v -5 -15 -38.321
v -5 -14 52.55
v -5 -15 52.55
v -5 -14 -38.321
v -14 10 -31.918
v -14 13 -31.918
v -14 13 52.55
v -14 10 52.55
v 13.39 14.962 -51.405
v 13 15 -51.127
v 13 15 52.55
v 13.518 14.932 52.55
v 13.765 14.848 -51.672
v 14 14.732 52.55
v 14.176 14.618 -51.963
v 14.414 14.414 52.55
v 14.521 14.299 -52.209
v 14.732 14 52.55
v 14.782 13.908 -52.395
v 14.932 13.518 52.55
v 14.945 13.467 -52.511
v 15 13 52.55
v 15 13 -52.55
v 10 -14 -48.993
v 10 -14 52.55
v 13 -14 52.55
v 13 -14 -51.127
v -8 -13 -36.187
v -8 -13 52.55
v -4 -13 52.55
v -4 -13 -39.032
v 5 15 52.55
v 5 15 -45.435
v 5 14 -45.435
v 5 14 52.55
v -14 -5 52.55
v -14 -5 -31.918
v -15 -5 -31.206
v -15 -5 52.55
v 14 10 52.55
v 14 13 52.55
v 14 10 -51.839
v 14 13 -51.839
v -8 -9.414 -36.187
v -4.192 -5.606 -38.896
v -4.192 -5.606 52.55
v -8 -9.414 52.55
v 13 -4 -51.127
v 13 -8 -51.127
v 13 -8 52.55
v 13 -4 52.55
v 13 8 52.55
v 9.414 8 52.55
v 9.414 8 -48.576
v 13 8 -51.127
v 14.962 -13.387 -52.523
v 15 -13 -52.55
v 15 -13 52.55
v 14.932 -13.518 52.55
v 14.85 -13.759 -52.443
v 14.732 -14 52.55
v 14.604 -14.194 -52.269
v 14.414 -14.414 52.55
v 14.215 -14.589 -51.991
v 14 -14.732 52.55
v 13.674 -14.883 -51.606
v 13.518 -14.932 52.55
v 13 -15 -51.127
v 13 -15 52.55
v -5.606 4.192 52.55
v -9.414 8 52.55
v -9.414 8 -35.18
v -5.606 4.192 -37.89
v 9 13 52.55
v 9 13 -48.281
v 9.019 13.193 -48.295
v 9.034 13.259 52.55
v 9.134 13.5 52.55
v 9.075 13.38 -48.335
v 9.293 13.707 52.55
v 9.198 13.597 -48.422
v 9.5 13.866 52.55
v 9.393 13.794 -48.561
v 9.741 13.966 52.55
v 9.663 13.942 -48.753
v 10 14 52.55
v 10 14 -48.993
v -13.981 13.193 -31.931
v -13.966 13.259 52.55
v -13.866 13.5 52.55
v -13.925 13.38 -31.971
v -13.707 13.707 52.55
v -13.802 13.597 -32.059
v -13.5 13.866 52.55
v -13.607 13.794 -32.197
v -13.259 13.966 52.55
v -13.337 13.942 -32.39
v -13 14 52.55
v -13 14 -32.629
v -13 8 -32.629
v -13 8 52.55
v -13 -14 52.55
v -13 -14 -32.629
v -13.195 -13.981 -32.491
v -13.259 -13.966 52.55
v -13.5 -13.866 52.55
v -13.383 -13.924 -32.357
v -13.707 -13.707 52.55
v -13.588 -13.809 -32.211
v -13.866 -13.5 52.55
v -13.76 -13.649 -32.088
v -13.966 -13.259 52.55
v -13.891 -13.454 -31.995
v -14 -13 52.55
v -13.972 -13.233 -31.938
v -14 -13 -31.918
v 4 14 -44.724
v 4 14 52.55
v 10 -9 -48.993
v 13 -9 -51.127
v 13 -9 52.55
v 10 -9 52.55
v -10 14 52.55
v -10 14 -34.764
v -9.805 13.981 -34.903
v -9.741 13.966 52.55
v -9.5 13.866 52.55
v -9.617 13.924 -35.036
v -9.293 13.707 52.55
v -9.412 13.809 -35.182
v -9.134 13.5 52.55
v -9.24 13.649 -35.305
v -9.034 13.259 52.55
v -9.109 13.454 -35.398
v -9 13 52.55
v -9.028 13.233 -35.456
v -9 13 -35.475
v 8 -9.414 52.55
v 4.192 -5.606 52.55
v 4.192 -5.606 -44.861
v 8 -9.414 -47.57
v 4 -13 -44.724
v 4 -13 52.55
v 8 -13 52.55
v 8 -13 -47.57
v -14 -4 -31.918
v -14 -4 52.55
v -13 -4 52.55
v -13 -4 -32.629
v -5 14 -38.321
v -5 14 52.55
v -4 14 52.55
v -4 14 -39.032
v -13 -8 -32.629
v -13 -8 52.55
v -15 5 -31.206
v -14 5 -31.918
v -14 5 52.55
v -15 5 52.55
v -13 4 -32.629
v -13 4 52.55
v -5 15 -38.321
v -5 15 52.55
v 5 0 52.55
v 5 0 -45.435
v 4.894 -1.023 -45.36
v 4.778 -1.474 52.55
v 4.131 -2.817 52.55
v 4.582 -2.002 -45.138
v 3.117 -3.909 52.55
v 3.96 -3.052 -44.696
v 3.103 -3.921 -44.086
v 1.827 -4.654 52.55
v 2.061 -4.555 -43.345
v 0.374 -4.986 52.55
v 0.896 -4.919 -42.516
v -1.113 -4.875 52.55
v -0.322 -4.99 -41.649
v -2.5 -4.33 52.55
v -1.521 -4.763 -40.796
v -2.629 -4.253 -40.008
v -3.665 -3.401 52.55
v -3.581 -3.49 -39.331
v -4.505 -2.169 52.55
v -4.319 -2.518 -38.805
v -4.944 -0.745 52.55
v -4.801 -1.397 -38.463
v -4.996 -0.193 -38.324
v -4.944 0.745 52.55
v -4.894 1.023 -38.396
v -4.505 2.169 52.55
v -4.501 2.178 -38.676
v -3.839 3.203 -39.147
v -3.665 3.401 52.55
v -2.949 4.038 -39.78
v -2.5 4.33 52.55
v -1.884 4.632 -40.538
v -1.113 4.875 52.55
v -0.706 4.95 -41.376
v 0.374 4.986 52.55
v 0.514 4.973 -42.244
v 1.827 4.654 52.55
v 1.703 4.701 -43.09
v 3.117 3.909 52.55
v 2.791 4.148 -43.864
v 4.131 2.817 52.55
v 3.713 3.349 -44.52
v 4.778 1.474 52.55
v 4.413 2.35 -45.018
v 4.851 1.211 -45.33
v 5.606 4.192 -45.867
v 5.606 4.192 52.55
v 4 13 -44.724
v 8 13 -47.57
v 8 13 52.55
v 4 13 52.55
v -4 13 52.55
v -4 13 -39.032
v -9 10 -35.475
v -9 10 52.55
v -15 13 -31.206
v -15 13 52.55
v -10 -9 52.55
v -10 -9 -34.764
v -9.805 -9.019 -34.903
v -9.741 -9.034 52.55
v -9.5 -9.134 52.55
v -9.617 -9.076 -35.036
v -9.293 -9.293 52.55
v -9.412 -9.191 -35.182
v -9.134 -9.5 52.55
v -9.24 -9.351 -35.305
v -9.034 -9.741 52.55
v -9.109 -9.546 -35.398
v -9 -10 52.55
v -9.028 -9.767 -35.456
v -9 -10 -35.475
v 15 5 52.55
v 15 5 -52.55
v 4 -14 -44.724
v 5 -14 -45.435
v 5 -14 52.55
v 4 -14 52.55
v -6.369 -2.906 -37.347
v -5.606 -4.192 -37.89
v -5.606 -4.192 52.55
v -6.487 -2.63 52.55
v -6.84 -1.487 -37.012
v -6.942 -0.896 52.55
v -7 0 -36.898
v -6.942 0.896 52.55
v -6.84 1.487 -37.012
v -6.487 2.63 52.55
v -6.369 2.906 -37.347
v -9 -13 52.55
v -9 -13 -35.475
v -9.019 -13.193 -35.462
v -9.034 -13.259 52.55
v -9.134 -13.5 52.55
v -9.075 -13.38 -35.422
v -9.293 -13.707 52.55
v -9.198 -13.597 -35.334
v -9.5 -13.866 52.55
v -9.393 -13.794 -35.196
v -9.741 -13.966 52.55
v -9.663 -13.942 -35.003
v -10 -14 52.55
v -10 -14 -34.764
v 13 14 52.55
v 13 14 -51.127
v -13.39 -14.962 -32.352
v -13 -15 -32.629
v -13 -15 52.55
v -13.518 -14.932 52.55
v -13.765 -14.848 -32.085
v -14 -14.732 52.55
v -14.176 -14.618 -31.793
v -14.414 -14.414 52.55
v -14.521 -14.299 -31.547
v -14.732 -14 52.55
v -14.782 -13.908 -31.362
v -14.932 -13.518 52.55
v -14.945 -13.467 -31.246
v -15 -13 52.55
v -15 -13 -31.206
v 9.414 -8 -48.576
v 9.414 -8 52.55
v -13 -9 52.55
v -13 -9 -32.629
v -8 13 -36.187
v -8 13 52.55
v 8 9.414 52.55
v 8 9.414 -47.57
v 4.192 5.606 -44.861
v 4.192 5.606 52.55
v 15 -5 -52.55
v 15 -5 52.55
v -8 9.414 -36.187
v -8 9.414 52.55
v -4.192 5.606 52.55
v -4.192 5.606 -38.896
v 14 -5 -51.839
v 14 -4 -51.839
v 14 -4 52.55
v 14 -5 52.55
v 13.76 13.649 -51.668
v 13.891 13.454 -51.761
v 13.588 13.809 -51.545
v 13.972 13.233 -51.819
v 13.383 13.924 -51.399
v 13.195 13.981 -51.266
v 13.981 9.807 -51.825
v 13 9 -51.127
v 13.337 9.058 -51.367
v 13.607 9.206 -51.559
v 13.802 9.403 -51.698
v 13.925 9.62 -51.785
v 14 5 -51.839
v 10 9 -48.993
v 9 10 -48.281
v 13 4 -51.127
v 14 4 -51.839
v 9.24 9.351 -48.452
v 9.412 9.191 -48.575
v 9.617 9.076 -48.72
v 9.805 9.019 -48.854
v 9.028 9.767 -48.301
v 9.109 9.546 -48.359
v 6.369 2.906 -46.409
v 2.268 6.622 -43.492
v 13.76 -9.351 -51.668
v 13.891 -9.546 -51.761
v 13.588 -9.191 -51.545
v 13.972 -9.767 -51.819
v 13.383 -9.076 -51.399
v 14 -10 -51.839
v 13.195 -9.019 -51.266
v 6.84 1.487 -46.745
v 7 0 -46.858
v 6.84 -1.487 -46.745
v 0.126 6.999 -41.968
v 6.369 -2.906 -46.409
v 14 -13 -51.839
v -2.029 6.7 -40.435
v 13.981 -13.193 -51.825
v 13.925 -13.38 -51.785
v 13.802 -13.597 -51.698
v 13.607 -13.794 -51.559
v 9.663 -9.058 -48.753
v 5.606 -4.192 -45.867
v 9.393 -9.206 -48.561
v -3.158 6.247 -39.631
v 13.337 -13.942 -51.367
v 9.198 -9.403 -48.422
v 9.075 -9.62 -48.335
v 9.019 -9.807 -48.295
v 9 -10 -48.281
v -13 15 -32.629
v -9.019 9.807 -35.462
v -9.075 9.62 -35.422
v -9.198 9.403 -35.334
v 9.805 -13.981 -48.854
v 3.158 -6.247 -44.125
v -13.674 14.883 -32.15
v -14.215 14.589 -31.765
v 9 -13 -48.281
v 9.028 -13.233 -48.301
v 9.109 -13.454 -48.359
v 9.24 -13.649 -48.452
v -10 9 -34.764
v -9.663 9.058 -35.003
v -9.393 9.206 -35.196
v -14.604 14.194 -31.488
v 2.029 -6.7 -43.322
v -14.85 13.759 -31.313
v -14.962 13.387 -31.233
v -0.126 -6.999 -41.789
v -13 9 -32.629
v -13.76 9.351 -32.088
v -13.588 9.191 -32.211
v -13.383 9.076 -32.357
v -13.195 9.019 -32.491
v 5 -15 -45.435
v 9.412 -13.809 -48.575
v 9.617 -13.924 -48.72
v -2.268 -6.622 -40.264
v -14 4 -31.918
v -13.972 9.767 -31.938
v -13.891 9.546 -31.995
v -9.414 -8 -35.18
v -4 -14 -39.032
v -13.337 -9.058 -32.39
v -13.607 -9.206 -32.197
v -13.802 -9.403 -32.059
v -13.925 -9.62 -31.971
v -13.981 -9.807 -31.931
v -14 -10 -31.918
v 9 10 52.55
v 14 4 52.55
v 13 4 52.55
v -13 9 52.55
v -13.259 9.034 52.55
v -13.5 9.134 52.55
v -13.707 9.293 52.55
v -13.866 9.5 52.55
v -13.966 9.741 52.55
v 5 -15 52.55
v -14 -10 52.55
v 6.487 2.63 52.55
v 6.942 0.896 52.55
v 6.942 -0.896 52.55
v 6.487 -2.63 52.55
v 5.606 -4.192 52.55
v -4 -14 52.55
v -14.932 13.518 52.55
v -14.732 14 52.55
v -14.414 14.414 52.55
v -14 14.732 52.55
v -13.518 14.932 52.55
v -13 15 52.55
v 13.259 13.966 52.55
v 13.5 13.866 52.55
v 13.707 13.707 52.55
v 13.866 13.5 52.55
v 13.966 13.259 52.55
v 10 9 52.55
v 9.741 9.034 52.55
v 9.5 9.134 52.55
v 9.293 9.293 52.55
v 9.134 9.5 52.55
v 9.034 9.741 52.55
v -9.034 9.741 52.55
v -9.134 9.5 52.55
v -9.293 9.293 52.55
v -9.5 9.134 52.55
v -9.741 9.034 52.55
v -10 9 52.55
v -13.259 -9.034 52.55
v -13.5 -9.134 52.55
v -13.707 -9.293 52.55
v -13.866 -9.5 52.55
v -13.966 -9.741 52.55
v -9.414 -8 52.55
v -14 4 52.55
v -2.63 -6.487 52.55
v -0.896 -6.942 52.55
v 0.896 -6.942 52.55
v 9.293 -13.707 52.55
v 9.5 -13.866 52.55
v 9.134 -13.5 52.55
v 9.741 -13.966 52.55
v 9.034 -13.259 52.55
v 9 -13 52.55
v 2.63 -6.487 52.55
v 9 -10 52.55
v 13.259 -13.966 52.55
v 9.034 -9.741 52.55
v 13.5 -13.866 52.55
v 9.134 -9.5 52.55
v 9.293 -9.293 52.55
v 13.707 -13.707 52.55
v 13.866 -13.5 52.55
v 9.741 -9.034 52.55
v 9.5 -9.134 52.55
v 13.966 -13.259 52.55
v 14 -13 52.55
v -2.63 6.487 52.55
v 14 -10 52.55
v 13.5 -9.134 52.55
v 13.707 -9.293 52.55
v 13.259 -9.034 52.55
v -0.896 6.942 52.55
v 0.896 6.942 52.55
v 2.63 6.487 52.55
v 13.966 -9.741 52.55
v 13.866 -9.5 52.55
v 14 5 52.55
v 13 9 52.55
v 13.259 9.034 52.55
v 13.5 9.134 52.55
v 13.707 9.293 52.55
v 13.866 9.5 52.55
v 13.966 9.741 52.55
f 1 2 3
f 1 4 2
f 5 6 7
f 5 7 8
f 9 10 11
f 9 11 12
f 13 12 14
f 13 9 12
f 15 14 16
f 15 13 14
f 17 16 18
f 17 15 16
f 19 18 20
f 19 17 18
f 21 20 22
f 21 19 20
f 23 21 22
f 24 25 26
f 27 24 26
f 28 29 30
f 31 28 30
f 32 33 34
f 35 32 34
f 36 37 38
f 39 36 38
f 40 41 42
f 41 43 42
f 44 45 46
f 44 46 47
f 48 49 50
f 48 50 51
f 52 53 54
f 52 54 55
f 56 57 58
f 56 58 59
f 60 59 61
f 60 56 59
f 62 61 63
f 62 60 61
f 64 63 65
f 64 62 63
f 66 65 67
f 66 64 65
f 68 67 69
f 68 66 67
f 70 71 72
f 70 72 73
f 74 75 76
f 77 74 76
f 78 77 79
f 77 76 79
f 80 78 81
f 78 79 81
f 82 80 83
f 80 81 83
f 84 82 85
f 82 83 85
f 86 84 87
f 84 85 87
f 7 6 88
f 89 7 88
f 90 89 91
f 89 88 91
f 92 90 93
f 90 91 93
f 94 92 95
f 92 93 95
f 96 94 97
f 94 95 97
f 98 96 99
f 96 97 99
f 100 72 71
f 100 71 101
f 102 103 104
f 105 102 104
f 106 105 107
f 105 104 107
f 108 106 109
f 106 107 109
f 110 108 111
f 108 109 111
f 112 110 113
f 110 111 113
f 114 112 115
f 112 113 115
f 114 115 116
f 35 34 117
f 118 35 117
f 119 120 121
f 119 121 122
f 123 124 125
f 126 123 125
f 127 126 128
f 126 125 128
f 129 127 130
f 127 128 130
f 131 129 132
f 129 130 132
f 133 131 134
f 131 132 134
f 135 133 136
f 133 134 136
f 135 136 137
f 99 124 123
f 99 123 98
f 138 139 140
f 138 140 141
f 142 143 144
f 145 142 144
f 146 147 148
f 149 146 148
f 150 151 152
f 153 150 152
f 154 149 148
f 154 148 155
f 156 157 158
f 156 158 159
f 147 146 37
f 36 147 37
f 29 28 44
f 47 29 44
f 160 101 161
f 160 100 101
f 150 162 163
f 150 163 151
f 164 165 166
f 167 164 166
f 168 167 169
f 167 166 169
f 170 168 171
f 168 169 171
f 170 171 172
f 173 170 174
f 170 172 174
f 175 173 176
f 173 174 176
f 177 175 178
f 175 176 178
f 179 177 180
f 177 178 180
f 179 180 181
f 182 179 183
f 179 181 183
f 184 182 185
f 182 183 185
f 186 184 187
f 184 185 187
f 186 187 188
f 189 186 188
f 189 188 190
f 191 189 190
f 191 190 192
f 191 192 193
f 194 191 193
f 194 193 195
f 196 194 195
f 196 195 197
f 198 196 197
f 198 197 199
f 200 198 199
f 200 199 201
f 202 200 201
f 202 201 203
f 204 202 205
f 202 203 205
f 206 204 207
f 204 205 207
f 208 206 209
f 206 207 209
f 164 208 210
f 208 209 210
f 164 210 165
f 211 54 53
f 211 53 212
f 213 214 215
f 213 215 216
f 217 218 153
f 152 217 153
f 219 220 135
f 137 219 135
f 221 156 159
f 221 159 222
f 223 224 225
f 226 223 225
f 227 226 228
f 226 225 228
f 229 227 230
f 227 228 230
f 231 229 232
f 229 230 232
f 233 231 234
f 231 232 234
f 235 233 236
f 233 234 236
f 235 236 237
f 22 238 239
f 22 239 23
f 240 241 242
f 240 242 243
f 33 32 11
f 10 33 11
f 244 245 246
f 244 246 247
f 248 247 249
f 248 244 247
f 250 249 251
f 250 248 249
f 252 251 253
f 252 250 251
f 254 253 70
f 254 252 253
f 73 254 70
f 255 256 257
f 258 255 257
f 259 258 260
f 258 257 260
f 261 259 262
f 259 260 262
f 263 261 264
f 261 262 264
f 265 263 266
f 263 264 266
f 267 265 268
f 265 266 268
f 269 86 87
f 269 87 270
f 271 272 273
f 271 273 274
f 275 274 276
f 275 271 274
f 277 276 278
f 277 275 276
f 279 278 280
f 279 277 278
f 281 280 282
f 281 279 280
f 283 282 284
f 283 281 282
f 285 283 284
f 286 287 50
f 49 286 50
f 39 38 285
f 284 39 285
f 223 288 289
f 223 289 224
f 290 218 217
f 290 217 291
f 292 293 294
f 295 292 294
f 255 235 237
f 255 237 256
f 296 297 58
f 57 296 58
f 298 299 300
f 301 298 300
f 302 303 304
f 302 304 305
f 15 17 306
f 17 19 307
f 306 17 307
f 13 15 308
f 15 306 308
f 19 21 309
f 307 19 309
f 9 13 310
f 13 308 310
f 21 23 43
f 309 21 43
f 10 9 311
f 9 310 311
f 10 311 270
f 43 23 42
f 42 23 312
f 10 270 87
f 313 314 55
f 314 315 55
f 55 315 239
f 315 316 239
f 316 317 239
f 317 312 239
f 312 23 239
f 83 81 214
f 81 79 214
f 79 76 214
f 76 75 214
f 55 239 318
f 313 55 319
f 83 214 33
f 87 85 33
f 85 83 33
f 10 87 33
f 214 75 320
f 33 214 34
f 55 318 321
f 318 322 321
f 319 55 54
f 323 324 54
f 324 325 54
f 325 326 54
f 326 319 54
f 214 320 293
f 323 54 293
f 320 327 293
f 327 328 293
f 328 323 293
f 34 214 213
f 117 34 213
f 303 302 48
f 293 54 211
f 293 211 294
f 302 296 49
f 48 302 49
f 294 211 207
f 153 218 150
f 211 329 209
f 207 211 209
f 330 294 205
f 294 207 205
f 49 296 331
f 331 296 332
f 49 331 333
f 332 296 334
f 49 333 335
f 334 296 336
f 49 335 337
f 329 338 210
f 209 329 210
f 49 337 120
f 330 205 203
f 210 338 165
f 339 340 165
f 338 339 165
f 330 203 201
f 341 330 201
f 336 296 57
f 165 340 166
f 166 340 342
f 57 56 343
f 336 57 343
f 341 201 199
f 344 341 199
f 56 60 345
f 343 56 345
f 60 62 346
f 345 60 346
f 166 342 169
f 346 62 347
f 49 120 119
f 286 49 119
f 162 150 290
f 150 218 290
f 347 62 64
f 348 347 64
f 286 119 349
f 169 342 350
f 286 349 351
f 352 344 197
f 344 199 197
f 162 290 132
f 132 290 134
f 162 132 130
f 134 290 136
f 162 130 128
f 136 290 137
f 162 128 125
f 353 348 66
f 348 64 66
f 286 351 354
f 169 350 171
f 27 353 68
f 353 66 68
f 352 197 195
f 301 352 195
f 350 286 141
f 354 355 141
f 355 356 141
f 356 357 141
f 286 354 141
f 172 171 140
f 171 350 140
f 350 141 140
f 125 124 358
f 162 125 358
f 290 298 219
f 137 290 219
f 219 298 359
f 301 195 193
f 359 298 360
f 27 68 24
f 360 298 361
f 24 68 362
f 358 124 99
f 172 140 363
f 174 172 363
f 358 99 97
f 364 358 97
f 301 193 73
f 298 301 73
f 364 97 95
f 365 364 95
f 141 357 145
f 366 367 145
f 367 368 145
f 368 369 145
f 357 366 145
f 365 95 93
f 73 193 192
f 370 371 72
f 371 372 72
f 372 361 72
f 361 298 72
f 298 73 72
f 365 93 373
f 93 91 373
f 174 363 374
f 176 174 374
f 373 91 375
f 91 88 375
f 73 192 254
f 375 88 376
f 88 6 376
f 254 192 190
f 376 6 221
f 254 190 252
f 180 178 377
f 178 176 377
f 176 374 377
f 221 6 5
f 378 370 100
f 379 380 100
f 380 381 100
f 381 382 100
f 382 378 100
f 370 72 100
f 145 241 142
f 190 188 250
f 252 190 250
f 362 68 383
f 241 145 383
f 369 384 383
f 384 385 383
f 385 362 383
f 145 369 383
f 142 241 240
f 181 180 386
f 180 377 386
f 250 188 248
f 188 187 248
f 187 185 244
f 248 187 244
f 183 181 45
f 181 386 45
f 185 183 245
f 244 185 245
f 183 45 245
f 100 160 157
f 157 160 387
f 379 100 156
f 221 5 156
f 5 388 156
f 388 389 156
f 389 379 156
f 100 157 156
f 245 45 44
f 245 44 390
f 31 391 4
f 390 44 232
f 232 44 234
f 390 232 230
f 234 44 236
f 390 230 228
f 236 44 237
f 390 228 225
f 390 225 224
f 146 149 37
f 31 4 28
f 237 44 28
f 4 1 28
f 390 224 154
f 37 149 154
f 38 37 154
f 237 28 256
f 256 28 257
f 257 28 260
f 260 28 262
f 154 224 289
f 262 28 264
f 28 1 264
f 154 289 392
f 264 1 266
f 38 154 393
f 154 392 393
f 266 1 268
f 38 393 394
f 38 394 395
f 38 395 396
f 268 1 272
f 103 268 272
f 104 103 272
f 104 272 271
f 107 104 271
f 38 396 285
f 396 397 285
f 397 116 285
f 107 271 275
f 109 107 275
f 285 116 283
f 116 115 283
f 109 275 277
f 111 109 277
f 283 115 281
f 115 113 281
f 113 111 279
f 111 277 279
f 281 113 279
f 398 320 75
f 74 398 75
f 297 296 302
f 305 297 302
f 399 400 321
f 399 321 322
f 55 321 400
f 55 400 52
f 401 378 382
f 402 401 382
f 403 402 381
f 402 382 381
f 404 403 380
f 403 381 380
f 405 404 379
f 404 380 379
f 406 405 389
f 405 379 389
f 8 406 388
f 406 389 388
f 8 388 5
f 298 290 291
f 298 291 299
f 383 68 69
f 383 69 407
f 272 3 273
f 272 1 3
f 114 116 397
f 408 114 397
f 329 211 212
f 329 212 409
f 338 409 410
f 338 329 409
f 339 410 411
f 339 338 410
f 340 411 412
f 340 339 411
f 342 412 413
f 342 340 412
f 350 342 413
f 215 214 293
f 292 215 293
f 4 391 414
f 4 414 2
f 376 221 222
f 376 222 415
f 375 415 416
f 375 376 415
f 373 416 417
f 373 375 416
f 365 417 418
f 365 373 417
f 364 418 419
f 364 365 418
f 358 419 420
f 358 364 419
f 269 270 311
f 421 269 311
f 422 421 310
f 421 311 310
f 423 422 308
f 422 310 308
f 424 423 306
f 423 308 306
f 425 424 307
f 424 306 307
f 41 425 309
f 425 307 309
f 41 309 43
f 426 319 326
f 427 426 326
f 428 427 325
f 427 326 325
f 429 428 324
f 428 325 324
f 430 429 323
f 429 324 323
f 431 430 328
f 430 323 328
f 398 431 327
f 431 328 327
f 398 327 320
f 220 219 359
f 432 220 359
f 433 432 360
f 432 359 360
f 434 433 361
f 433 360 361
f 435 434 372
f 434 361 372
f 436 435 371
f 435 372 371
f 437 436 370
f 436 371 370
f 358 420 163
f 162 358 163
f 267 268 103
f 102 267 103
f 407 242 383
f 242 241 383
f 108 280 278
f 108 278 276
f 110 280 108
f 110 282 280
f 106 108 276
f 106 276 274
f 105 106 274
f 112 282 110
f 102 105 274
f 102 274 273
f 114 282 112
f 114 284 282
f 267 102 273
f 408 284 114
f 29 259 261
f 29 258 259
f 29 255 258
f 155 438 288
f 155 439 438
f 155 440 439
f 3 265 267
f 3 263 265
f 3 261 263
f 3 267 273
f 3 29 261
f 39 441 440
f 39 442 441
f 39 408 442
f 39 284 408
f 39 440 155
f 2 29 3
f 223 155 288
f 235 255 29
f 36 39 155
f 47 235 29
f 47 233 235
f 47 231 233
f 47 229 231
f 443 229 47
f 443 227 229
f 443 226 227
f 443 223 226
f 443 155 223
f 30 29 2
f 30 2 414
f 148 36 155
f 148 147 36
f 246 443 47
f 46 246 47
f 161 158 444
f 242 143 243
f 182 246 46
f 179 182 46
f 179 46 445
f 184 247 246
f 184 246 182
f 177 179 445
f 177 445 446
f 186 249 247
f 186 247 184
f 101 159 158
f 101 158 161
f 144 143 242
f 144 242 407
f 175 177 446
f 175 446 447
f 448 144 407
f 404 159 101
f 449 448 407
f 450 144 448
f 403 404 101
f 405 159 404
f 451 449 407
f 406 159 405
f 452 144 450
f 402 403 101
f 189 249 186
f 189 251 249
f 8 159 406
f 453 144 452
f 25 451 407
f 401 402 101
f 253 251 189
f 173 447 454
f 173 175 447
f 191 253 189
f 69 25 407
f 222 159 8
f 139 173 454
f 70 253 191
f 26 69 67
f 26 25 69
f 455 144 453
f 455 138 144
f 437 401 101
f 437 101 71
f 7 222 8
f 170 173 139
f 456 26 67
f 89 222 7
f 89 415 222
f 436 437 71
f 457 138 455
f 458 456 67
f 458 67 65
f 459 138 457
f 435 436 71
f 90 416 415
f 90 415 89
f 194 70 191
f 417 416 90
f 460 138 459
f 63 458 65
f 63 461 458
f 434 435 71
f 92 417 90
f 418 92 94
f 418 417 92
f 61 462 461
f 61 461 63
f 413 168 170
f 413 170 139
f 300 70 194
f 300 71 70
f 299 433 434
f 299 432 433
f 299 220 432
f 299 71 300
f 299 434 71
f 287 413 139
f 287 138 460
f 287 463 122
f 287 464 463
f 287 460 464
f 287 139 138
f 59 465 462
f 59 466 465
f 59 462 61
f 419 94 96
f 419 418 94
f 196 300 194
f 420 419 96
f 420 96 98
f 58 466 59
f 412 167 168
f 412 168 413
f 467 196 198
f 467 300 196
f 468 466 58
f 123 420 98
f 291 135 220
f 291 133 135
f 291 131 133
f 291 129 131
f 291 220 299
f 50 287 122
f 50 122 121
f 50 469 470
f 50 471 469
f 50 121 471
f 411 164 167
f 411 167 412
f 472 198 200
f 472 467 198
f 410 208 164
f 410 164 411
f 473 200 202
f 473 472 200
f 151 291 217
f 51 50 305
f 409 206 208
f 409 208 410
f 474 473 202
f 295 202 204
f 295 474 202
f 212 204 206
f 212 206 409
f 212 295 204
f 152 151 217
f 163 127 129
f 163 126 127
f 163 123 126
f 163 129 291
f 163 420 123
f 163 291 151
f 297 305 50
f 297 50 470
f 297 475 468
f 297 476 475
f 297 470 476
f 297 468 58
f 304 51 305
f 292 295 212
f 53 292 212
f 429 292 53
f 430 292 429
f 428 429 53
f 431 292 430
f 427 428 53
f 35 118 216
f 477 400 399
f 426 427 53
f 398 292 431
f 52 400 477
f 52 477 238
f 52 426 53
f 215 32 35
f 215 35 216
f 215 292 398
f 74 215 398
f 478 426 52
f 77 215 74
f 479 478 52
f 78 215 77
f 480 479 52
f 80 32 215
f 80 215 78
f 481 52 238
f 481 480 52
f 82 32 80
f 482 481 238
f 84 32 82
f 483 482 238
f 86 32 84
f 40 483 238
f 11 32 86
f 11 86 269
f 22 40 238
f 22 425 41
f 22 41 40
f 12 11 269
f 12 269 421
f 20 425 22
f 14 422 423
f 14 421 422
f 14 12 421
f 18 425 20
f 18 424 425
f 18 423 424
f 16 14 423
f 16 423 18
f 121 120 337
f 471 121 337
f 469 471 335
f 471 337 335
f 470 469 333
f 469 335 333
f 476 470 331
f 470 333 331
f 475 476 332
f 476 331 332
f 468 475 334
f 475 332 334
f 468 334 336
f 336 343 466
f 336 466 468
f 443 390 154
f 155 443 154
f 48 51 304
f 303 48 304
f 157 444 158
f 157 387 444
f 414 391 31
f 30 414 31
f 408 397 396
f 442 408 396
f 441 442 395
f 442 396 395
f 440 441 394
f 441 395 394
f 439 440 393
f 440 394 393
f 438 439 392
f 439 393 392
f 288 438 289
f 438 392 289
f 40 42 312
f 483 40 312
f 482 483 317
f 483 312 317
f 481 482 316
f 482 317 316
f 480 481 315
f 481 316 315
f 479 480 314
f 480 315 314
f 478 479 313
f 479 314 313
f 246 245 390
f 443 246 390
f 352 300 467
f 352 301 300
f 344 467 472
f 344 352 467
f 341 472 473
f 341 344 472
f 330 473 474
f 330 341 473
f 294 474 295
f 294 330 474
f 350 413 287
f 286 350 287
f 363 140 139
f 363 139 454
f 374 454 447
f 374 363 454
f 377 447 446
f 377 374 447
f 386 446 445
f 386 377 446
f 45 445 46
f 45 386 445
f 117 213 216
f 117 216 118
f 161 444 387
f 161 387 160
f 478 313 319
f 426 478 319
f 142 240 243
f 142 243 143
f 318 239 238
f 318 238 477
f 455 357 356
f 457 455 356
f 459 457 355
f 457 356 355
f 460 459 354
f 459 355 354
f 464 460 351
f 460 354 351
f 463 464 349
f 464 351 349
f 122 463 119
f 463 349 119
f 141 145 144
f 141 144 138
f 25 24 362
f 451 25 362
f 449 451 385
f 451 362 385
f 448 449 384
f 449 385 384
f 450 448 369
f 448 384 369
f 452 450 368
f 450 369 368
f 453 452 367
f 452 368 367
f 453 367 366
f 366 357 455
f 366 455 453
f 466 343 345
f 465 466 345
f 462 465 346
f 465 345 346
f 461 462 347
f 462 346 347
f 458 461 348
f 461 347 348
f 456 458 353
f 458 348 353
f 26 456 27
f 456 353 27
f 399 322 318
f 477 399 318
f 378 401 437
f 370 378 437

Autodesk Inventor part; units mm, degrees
ref_plane "YZ Plane" through (0, 0, 0) normal (1, 0, 0) x (0, 1, 0)
ref_plane "XZ Plane" through (0, 0, 0) normal (0, 1, 0) x (-1, 0, 0)
ref_plane "XY Plane" through (0, 0, 0) normal (0, 0, 1) x (1, 0, 0)
sketch "Sketch1" plane through (0, 0, 0) normal (0, 0, 1) x (1, 0, 0)
  circle A0 centre (0, 0) radius 5
  arc A1 (-13, 15) -> (-15, 13) centre (-13, 13) ccw
  arc A2 (-15, -13) -> (-13, -15) centre (-13, -13) ccw
  arc A3 (13, -15) -> (15, -13) centre (13, -13) ccw
  arc A4 (15, 13) -> (13, 15) centre (13, 13) ccw
  arc A5 (-13, 14) -> (-14, 13) centre (-13, 13) ccw
  arc A6 (-14, -13) -> (-13, -14) centre (-13, -13) ccw
  arc A7 (13, -14) -> (14, -13) centre (13, -13) ccw
  arc A8 (14, 13) -> (13, 14) centre (13, 13) ccw
  line L0 (14, -14) -> (-14, 14) construction
  line L1 (-14, -14) -> (14, 14) construction
  line L2 (15, -15) -> (-15, 15) construction
  line L3 (-15, -15) -> (15, 15) construction
  line L4 (-13, 15) -> (-8, 15)
  line L5 (-8, 13) -> (-8, 8) construction
  line L6 (-9.4142, 8) -> (-13, 8)
  line L7 (-15, 8) -> (-15, 13)
  line L8 (-13, -15) -> (-8, -15)
  line L9 (-8, -13) -> (-8, -9.4142)
  line L10 (-9.4142, -8) -> (-13, -8)
  line L11 (-15, -8) -> (-15, -13)
  line L12 (13, -15) -> (8, -15)
  line L13 (8, -13) -> (8, -9.4142)
  line L14 (9.4142, -8) -> (13, -8)
  line L15 (15, -8) -> (15, -13)
  line L16 (13, 15) -> (8, 15)
  line L17 (8, 13) -> (8, 9.4142)
  line L18 (9.4142, 8) -> (13, 8)
  line L19 (15, 8) -> (15, 13)
  line L20 (-13, 9) -> (-10, 9)
  line L21 (-9, 10) -> (-9, 13)
  line L22 (-10, 14) -> (-13, 14)
  line L23 (-14, 13) -> (-14, 10)
  line L24 (13, 9) -> (10, 9)
  line L25 (9, 10) -> (9, 13)
  line L26 (10, 14) -> (13, 14)
  line L27 (14, 13) -> (14, 10)
  line L28 (13, -9) -> (10, -9)
  line L29 (9, -10) -> (9, -13)
  line L30 (10, -14) -> (13, -14)
  line L31 (14, -13) -> (14, -10)
  line L32 (-13, -9) -> (-10, -9)
  line L33 (-9, -10) -> (-9, -13)
  line L34 (-10, -14) -> (-13, -14)
  line L35 (-14, -13) -> (-14, -10)
  line L36 (-14, 13) -> (-14, 10)
  line L37 (-14, -10) -> (-14, -13)
  line L38 (-14, -13) -> (-14, -10)
  line L39 (-14, 10) -> (-14, 13)
  line L40 (13, -15) -> (5, -15)
  line L41 (-5, -15) -> (-13, -15)
  line L42 (13, -15) -> (5, -15) construction
  line L43 (0, -15) -> (-13, -15) construction
  line L44 (4, -13) -> (8, -13)
  line L45 (-8, -13) -> (-4, -13)
  line L46 (10, -9) -> (13, -9)
  line L47 (14, -10) -> (14, -13)
  line L48 (13, -14) -> (10, -14)
  line L49 (9, -13) -> (9, -10)
  line L50 (5, -14) -> (5, -15)
  line L51 (13, -14) -> (10, -14)
  line L52 (5, -14) -> (4, -14)
  line L53 (4, -14) -> (5, -14)
  line L54 (10, -14) -> (13, -14)
  line L55 (-4, -14) -> (-5, -14)
  line L56 (-10, -14) -> (-13, -14)
  line L57 (-13, -14) -> (-10, -14)
  line L58 (-5, -14) -> (-4, -14)
  line L59 (14, -13) -> (14, -10)
  line L60 (14, 10) -> (14, 13)
  line L61 (14, 13) -> (14, 10)
  line L62 (14, -10) -> (14, -13)
  line L63 (-5, -14) -> (-5, -15)
  line L64 (10, 14) -> (13, 14)
  line L65 (13, 14) -> (10, 14)
  line L66 (-10, 14) -> (-13, 14)
  line L67 (-13, 14) -> (-10, 14)
  line L68 (-5, 15) -> (-5, 14)
  line L69 (-13, 15) -> (-5, 15)
  line L70 (5, 15) -> (13, 15)
  line L71 (-15, 15) -> (-5, 15) construction
  line L72 (5, 15) -> (15, 15) construction
  line L73 (5, 15) -> (5, 14)
  line L74 (8, 13) -> (4, 13)
  line L75 (5, 14) -> (4, 14)
  line L76 (-5, 14) -> (-4, 14)
  line L77 (4, 14) -> (5, 14)
  line L78 (-4, 13) -> (-8, 13)
  line L79 (-4, 14) -> (-5, 14)
  line L80 (4, 13) -> (4, 14)
  line L81 (-4, 13) -> (-4, 14)
  line L82 (-4, -14) -> (-4, -13)
  line L83 (4, -14) -> (4, -13)
  line L84 (-8, 9.4142) -> (-4.1919, 5.6061)
  line L85 (8, 9.4142) -> (4.1919, 5.6061)
  line L86 (9.4142, 8) -> (5.6061, 4.1919)
  line L87 (5.6061, -4.1919) -> (9.4142, -8)
  line L88 (4.1919, -5.6061) -> (8, -9.4142)
  line L89 (-4.1919, -5.6061) -> (-8, -9.4142)
  line L90 (-5.6061, -4.1919) -> (-9.4142, -8)
  line L91 (-9.4142, 8) -> (-5.6061, 4.1919)
  arc A9 (4.1919, 5.6061) -> (-4.1919, 5.6061) centre (0, 0) ccw
  arc A10 (5.6061, -4.1919) -> (5.6061, 4.1919) centre (0, 0) ccw
  arc A11 (-5.6061, 4.1919) -> (-5.6061, -4.1919) centre (0, 0) ccw
  arc A12 (-4.1919, -5.6061) -> (4.1919, -5.6061) centre (0, 0) ccw
  line L92 (-8, 13) -> (-8, 9.4142)
  line L93 (-15, -13) -> (-15, -5) construction
  line L94 (-15, -13) -> (-15, -5)
  line L95 (-15, 5) -> (-15, 13)
  line L96 (15, -5) -> (15, -13) construction
  line L97 (15, 13) -> (15, 5)
  line L98 (15, -5) -> (15, -13)
  line L99 (-14, -4) -> (-14, -5)
  line L100 (14, -4) -> (14, -5)
  line L101 (14, 4) -> (14, 5)
  line L102 (-14, 4) -> (-14, 5)
  line L103 (-13, 8) -> (-13, 4)
  line L104 (13, 4) -> (13, 8)
  line L105 (13, -8) -> (13, -4)
  line L106 (-13, -4) -> (-13, -8)
  line L107 (-14, -5) -> (-15, -5)
  line L108 (15, -5) -> (14, -5)
  line L109 (15, 5) -> (14, 5)
  line L110 (-14, 5) -> (-15, 5)
  line L111 (13, 4) -> (14, 4)
  line L112 (-14, 4) -> (-13, 4)
  line L113 (-14, -4) -> (-13, -4)
  line L114 (13, -4) -> (14, -4)
  arc A13 (-13, -9) -> (-14, -10) centre (-13, -10) ccw
  arc A14 (-9, -10) -> (-10, -9) centre (-10, -10) ccw
  arc A15 (-10, -14) -> (-9, -13) centre (-10, -13) ccw
  arc A16 (10, -9) -> (9, -10) centre (10, -10) ccw
  arc A17 (9, -13) -> (10, -14) centre (10, -13) ccw
  arc A18 (14, -10) -> (13, -9) centre (13, -10) ccw
  arc A19 (10, 14) -> (9, 13) centre (10, 13) ccw
  arc A20 (9, 10) -> (10, 9) centre (10, 10) ccw
  arc A21 (13, 9) -> (14, 10) centre (13, 10) ccw
  arc A22 (-9, 13) -> (-10, 14) centre (-10, 13) ccw
  arc A23 (-10, 9) -> (-9, 10) centre (-10, 10) ccw
  arc A24 (-14, 10) -> (-13, 9) centre (-13, 10) ccw
  point P0 (15, -15)
  point P1 (-5.5858, -7)
  dimension "d0" = 30
  dimension "d1" = 30
  dimension "d2" = 10
  dimension "d4" = 2
  dimension "d11" = 28
  dimension "d12" = 7
  dimension "d13" = 7
  dimension "d15" = 1
  dimension "d16" = 1
  dimension "d17" = 1
  dimension "d18" = 1
  dimension "d19" = 5
  dimension "d23" = 30
  dimension "d27" = 1
  dimension "d30" = 3.5858
  dimension "d31" = 2
  dimension "d32" = 16
  dimension "d33" = 8
  dimension "d34" = 6
  dimension "d35" = 5.5858
extrude "Extrusion1" add sketch "Sketch1" along normal mid plane 105.1
sketch "Sketch3" plane through (-13, -15, 52.55) normal (0, -1, 0) x (1, 0, 0)
  line L0 (18, -105.1) -> (8, -105.1) projected
  line L1 (0, -105.1) -> (-1, -105.1) projected
  line L2 (-1, -105.1) -> (0, -105.1) projected
  line L3 (0, -105.1) -> (3, -105.1) projected
  line L4 (3, -105.1) -> (4, -105.1) projected
  line L5 (4, -105.1) -> (3, -105.1) projected
  line L6 (3, -105.1) -> (0, -105.1) projected
  line L7 (26, -105.1) -> (23, -105.1) projected
  line L8 (23, -105.1) -> (22, -105.1) projected
  line L9 (22, -105.1) -> (23, -105.1) projected
  line L10 (23, -105.1) -> (26, -105.1) projected
  line L11 (26, -105.1) -> (27, -105.1) projected
  line L12 (27, -105.1) -> (26, -105.1) projected
  line L13 (4, -105.1) -> (3, -105.1) projected
  line L14 (3, -105.1) -> (0, -105.1) projected
  line L15 (0, -105.1) -> (-1, -105.1) projected
  line L16 (-1, -105.1) -> (0, -105.1) projected
  line L17 (0, -105.1) -> (3, -105.1) projected
  line L18 (3, -105.1) -> (4, -105.1) projected
  line L19 (23, -105.1) -> (22, -105.1) projected
  line L20 (22, -105.1) -> (23, -105.1) projected
  line L21 (23, -105.1) -> (26, -105.1) projected
  line L22 (26, -105.1) -> (27, -105.1) projected
  line L23 (27, -105.1) -> (26, -105.1) projected
  line L24 (26, -105.1) -> (23, -105.1) projected
  line L25 (5, -105.1) -> (8.8081, -105.1) projected
  line L26 (8.8081, -105.1) -> (17.1919, -105.1) projected
  line L27 (17.1919, -105.1) -> (21, -105.1) projected
  line L28 (21, -105.1) -> (17, -105.1) projected
  line L29 (17, -105.1) -> (18, -105.1) projected
  line L30 (18, -105.1) -> (26, -105.1) projected
  line L31 (26, -105.1) -> (28, -105.1) projected
  line L32 (28, -105.1) -> (27, -105.1) projected
  line L33 (27, -105.1) -> (26, -105.1) projected
  line L34 (26, -105.1) -> (22.4142, -105.1) projected
  line L35 (22.4142, -105.1) -> (18.6061, -105.1) projected
  line L36 (18.6061, -105.1) -> (18.6061, -105.1) projected
  line L37 (18.6061, -105.1) -> (22.4142, -105.1) projected
  line L38 (22.4142, -105.1) -> (26, -105.1) projected
  line L39 (26, -105.1) -> (27, -105.1) projected
  line L40 (27, -105.1) -> (28, -105.1) projected
  line L41 (28, -105.1) -> (26, -105.1) projected
  line L42 (26, -105.1) -> (18, -105.1) projected
  line L43 (18, -105.1) -> (17, -105.1) projected
  line L44 (17, -105.1) -> (21, -105.1) projected
  line L45 (21, -105.1) -> (17.1919, -105.1) projected
  line L46 (17.1919, -105.1) -> (8.8081, -105.1) projected
  line L47 (8.8081, -105.1) -> (5, -105.1) projected
  line L48 (5, -105.1) -> (9, -105.1) projected
  line L49 (9, -105.1) -> (8, -105.1) projected
  line L50 (8, -105.1) -> (0, -105.1) projected
  line L51 (0, -105.1) -> (-2, -105.1) projected
  line L52 (-2, -105.1) -> (-1, -105.1) projected
  line L53 (-1, -105.1) -> (0, -105.1) projected
  line L54 (0, -105.1) -> (3.5858, -105.1) projected
  line L55 (3.5858, -105.1) -> (7.3939, -105.1) projected
  line L56 (7.3939, -105.1) -> (7.3939, -105.1) projected
  line L57 (7.3939, -105.1) -> (3.5858, -105.1) projected
  line L58 (3.5858, -105.1) -> (0, -105.1) projected
  line L59 (0, -105.1) -> (-1, -105.1) projected
  line L60 (-1, -105.1) -> (-2, -105.1) projected
  line L61 (-2, -105.1) -> (0, -105.1) projected
  line L62 (0, -105.1) -> (8, -105.1) projected
  line L63 (8, -105.1) -> (9, -105.1) projected
  line L64 (9, -105.1) -> (5, -105.1) projected
  line L65 (39.4927, -113.2765) -> (-27.442, -65.6557)
  line L66 (-27.442, -65.6557) -> (-27.442, -113.2765)
  line L67 (27, -105.1) -> (27, 0) projected
  line L68 (-27.442, -113.2765) -> (39.4927, -113.2765)
  point P0 (13, -52.55)
  dimension "d36" = 35.43
extrude "Extrusion2" cut sketch "Sketch3" against normal blind 30
equation "\"d1\" = d0"
properties part number "pole_supoort_2" material "Aluminum 6061"
